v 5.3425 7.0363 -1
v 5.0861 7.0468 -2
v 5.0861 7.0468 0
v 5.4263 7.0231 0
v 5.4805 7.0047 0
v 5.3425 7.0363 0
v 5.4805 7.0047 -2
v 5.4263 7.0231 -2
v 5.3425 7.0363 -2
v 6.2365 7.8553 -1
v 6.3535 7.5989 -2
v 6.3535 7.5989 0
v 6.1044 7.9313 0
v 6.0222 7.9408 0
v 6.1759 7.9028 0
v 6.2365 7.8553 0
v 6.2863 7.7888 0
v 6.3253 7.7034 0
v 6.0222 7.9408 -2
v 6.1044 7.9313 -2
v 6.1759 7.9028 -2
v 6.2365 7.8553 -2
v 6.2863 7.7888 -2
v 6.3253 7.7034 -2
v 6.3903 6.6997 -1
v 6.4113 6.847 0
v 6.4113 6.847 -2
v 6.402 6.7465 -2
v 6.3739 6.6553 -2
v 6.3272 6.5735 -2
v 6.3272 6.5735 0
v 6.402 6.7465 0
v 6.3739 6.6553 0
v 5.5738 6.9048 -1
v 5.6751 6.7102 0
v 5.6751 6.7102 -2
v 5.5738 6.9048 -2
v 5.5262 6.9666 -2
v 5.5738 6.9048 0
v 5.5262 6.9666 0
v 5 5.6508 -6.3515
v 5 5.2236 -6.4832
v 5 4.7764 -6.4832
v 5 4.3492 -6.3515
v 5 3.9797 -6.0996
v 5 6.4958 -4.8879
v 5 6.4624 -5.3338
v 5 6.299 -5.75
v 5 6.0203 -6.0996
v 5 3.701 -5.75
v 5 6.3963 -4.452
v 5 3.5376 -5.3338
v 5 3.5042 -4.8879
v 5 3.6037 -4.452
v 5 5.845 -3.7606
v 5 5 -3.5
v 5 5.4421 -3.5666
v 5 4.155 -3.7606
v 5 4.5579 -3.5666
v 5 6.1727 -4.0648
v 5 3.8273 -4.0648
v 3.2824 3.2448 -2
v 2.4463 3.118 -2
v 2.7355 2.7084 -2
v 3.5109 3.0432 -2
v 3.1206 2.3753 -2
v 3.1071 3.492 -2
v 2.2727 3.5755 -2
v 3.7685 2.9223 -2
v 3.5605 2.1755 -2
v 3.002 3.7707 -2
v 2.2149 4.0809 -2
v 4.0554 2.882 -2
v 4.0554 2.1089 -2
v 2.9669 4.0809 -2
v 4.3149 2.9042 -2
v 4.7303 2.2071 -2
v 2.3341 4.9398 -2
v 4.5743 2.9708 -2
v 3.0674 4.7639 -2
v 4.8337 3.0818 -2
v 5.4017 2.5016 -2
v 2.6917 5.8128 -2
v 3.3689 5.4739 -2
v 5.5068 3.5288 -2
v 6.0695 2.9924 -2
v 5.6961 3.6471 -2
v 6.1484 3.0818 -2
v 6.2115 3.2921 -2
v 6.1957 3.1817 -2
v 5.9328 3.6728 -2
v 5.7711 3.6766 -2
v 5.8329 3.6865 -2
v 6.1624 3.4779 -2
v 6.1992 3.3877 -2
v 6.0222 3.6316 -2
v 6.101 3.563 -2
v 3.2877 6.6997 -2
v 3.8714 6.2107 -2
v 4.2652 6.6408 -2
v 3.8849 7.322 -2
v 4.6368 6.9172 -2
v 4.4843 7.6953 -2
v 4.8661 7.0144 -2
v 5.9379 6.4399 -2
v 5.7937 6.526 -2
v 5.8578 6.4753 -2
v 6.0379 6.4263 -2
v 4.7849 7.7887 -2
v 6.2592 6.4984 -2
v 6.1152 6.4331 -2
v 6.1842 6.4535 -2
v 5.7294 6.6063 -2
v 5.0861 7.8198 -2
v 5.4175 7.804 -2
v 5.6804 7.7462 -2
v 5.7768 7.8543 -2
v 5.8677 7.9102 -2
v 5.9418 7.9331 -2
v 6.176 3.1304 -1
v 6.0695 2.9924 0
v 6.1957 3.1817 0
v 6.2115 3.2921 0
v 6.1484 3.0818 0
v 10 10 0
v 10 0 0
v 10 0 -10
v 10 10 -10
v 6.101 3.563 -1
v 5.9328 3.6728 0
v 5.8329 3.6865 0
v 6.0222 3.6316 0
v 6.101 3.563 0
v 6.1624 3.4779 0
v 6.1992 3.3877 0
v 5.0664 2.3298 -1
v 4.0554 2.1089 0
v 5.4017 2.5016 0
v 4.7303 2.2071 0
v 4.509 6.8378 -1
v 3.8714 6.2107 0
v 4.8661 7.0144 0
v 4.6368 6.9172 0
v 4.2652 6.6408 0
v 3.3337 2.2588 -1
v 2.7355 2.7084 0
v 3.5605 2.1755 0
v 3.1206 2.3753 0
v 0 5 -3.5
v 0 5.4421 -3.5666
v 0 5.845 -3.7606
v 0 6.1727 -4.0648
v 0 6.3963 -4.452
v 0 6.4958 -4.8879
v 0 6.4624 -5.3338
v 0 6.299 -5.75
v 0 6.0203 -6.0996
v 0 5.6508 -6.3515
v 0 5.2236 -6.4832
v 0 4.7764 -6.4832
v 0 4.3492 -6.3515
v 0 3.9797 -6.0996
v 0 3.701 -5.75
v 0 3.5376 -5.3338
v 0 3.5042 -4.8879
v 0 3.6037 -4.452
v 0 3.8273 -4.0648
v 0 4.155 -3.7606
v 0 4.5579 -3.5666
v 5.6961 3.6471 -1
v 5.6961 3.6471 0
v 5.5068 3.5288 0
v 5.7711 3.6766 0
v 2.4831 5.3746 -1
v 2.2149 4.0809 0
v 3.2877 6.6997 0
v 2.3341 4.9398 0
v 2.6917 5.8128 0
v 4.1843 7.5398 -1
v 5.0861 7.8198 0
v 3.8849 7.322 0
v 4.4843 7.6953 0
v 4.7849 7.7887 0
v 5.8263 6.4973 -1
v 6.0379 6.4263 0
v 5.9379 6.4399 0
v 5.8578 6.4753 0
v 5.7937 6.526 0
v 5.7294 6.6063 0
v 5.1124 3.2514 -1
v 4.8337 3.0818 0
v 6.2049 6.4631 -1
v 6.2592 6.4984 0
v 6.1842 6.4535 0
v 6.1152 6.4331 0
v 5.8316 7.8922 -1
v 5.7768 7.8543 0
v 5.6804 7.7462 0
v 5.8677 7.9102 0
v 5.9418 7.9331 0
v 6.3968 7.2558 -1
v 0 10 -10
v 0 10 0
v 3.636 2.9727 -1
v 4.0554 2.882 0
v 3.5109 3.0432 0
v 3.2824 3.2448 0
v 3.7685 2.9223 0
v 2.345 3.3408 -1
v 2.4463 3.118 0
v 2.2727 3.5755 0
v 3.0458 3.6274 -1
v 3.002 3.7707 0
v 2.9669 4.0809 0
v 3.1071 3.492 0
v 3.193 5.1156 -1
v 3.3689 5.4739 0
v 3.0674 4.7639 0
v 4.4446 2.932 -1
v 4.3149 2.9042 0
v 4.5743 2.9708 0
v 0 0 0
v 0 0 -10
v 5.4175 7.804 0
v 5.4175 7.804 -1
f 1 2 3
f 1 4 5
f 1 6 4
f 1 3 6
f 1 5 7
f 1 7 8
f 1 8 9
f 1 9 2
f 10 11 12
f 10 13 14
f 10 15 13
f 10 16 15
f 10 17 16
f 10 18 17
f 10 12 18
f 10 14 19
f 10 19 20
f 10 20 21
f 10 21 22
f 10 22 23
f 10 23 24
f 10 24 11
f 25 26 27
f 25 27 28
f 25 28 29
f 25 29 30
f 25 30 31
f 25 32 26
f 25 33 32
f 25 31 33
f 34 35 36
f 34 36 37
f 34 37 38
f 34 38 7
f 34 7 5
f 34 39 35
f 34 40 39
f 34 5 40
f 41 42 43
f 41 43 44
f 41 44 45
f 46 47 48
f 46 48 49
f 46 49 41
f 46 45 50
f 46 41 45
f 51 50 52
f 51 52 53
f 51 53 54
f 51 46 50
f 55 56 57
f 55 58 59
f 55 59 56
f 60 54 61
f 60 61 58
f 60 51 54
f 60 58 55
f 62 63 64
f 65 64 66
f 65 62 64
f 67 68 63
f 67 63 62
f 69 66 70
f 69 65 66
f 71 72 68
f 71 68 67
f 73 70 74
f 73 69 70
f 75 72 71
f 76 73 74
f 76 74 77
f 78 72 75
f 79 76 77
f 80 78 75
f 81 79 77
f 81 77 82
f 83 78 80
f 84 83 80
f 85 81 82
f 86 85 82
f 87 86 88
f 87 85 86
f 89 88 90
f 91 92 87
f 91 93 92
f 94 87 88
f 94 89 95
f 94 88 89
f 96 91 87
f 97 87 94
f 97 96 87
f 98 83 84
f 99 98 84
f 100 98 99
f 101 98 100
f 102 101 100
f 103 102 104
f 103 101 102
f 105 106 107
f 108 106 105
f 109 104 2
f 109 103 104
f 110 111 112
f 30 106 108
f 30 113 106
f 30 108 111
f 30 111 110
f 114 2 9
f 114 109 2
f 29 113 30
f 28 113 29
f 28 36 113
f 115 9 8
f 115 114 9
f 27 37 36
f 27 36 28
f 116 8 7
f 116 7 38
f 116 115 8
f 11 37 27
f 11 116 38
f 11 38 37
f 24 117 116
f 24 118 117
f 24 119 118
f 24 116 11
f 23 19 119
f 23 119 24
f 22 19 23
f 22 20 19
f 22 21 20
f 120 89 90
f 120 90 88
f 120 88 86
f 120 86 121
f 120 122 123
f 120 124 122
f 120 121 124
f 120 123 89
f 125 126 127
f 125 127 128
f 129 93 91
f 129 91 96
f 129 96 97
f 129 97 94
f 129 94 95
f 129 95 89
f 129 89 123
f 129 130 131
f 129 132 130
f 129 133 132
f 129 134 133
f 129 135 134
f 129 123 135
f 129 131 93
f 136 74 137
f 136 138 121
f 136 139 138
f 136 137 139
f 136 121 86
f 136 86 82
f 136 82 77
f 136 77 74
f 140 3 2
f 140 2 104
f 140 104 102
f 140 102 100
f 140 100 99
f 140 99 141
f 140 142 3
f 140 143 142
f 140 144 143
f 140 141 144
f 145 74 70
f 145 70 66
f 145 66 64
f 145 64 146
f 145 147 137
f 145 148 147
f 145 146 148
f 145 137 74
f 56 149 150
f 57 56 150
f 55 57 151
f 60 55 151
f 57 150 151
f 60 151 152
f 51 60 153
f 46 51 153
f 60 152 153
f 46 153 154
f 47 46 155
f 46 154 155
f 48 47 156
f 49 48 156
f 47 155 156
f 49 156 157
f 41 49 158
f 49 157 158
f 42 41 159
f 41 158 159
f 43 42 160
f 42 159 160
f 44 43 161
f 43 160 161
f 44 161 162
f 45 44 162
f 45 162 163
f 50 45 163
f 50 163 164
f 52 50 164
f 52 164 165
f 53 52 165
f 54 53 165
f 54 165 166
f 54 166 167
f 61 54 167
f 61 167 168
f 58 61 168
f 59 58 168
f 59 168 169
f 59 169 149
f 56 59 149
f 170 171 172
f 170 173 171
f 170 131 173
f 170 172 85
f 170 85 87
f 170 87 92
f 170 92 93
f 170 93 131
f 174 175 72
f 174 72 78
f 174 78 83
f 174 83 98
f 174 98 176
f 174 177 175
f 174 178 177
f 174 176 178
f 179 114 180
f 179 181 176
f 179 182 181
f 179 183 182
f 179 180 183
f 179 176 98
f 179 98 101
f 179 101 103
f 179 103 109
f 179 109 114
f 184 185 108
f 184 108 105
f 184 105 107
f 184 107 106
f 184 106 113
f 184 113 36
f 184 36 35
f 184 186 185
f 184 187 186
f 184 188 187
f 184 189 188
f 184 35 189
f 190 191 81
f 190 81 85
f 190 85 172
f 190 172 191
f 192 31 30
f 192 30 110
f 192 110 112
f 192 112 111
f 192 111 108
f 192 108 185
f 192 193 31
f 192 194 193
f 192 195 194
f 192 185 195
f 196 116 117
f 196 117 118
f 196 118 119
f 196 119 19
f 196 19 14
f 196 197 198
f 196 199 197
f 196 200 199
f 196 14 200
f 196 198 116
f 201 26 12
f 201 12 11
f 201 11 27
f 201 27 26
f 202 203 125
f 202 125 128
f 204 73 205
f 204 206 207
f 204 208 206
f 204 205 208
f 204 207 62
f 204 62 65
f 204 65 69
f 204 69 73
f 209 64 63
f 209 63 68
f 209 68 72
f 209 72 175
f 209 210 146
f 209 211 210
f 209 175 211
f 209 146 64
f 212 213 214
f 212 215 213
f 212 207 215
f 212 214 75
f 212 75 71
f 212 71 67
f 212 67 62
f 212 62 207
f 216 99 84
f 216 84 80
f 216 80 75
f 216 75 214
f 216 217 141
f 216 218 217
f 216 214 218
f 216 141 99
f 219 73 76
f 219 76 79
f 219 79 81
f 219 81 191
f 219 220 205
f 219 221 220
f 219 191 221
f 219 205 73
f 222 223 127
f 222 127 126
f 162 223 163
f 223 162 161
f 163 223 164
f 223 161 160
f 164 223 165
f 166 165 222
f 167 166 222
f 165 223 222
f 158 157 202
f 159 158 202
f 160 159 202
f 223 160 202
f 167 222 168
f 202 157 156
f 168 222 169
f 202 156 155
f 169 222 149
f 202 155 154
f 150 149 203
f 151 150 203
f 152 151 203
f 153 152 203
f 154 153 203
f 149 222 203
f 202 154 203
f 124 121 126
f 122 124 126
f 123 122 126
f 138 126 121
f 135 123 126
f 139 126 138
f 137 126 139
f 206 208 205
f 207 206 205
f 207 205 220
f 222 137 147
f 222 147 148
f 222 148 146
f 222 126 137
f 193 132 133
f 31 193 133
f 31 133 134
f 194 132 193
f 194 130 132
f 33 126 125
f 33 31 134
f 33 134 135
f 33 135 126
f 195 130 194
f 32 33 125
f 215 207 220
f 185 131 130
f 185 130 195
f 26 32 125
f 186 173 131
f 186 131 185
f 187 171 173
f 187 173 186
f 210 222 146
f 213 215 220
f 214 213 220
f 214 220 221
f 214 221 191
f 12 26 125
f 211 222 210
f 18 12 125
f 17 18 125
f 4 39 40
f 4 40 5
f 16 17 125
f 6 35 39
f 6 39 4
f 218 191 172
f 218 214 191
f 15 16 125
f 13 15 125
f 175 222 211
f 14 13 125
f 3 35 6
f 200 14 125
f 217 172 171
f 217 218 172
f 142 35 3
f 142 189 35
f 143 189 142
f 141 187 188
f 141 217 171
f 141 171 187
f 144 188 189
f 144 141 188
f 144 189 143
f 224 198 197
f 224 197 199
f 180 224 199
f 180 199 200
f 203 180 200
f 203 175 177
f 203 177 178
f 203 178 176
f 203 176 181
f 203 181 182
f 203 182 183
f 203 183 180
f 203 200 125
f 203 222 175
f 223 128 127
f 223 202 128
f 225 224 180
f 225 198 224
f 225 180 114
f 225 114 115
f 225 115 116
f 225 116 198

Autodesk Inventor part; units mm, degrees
ref_plane "YZ Plane" through (0, 0, 0) normal (1, 0, 0) x (0, 1, 0)
ref_plane "XZ Plane" through (0, 0, 0) normal (0, 1, 0) x (-1, 0, 0)
ref_plane "XY Plane" through (0, 0, 0) normal (0, 0, 1) x (1, 0, 0)
sketch "Sketch1" plane through (0, 0, 0) normal (1, 0, 0) x (0, 1, 0)
  line L0 (0, 0) -> (10, 0)
  line L1 (10, 0) -> (10, -10)
  line L2 (10, -10) -> (0, -10)
  line L3 (0, -10) -> (0, 0)
  dimension "d0" = 10
  dimension "d1" = 10
extrude "Extrusion1" add sketch "Sketch1" along normal blind 10
sketch "Sketch3" plane through (0, 0, 0) normal (-1, 0, 0) x (0, 0, 1)
  circle A0 centre (-5, 5) radius 1.5
  point P0 (0, 0)
extrude "Extrusion3" cut sketch "Sketch3" against normal blind 5
sketch "Sketch4" plane through (0, 0, 0) normal (0, 0, 1) x (1, 0, 0)
  line L0 (1.8731, 7.9408) -> (4.4271, 7.9408) construction
  line L1 (4.4271, 7.9408) -> (4.4271, 4.8928) construction
  line L2 (4.4271, 4.8928) -> (1.8731, 4.8928) construction
  line L3 (1.8731, 4.8928) -> (1.8731, 7.9408) construction
  spline S0 degree 2 poles (6.0379, 6.4263) (5.7961, 6.4263) (5.6751, 6.7102) knots 0 0 0 1 1 1
  spline S1 degree 2 poles (5.6751, 6.7102) (5.5699, 6.9521) (5.4805, 7.0047) knots 0 0 0 1 1 1
  spline S2 degree 2 poles (5.4805, 7.0047) (5.4017, 7.0468) (5.0861, 7.0468) knots 0 0 0 1 1 1
  spline S3 degree 2 poles (5.0861, 7.0468) (4.5392, 7.0468) (3.8714, 6.2107) knots 0 0 0 1 1 1
  spline S4 degree 2 poles (3.8714, 6.2107) (2.9669, 5.0853) (2.9669, 4.0809) knots 0 0 0 1 1 1
  spline S5 degree 2 poles (2.9669, 4.0809) (2.9669, 3.5919) (3.2824, 3.2448) knots 0 0 0 1 1 1
  spline S6 degree 2 poles (3.2824, 3.2448) (3.6032, 2.882) (4.0554, 2.882) knots 0 0 0 1 1 1
  spline S7 degree 2 poles (4.0554, 2.882) (4.4446, 2.882) (4.8337, 3.0818) knots 0 0 0 1 1 1
  spline S8 degree 2 poles (4.8337, 3.0818) (5.0546, 3.1975) (5.5068, 3.5288) knots 0 0 0 1 1 1
  spline S9 degree 2 poles (5.5068, 3.5288) (5.7224, 3.6865) (5.8329, 3.6865) knots 0 0 0 1 1 1
  spline S10 degree 2 poles (5.8329, 3.6865) (5.9906, 3.6865) (6.2115, 3.4394) (6.2115, 3.2921) knots 0 0 0 1 2 2 2
  spline S11 degree 2 poles (6.2115, 3.2921) (6.2115, 3.1186) (6.0695, 2.9924) knots 0 0 0 1 1 1
  spline S12 degree 2 poles (6.0695, 2.9924) (5.0704, 2.1089) (4.0554, 2.1089) knots 0 0 0 1 1 1
  spline S13 degree 2 poles (4.0554, 2.1089) (3.2719, 2.1089) (2.7355, 2.7084) knots 0 0 0 1 1 1
  spline S14 degree 2 poles (2.7355, 2.7084) (2.2149, 3.2869) (2.2149, 4.0809) knots 0 0 0 1 1 1
  spline S15 degree 2 poles (2.2149, 4.0809) (2.2149, 5.3588) (3.2877, 6.6997) knots 0 0 0 1 1 1
  spline S16 degree 2 poles (3.2877, 6.6997) (4.1817, 7.8198) (5.0861, 7.8198) knots 0 0 0 1 1 1
  spline S17 degree 2 poles (5.0861, 7.8198) (5.2702, 7.8198) (5.5647, 7.7883) (5.6804, 7.7462) knots 0 0 0 1 2 2 2
  spline S18 degree 2 poles (5.6804, 7.7462) (5.8118, 7.9408) (6.0222, 7.9408) knots 0 0 0 1 1 1
  spline S19 degree 2 poles (6.0222, 7.9408) (6.2851, 7.9408) (6.3535, 7.5989) knots 0 0 0 1 1 1
  spline S20 degree 2 poles (6.3535, 7.5989) (6.4113, 7.2887) (6.4113, 6.847) knots 0 0 0 1 1 1
  spline S21 degree 2 poles (6.4113, 6.847) (6.4113, 6.6892) (6.3272, 6.5735) knots 0 0 0 1 1 1
  spline S22 degree 2 poles (6.3272, 6.5735) (6.2273, 6.4263) (6.0379, 6.4263) knots 0 0 0 1 1 1
  point P0 (0, 0)
extrude "Extrusion4" cut sketch "Sketch4" against normal blind 2
properties part number "Cytosine"
